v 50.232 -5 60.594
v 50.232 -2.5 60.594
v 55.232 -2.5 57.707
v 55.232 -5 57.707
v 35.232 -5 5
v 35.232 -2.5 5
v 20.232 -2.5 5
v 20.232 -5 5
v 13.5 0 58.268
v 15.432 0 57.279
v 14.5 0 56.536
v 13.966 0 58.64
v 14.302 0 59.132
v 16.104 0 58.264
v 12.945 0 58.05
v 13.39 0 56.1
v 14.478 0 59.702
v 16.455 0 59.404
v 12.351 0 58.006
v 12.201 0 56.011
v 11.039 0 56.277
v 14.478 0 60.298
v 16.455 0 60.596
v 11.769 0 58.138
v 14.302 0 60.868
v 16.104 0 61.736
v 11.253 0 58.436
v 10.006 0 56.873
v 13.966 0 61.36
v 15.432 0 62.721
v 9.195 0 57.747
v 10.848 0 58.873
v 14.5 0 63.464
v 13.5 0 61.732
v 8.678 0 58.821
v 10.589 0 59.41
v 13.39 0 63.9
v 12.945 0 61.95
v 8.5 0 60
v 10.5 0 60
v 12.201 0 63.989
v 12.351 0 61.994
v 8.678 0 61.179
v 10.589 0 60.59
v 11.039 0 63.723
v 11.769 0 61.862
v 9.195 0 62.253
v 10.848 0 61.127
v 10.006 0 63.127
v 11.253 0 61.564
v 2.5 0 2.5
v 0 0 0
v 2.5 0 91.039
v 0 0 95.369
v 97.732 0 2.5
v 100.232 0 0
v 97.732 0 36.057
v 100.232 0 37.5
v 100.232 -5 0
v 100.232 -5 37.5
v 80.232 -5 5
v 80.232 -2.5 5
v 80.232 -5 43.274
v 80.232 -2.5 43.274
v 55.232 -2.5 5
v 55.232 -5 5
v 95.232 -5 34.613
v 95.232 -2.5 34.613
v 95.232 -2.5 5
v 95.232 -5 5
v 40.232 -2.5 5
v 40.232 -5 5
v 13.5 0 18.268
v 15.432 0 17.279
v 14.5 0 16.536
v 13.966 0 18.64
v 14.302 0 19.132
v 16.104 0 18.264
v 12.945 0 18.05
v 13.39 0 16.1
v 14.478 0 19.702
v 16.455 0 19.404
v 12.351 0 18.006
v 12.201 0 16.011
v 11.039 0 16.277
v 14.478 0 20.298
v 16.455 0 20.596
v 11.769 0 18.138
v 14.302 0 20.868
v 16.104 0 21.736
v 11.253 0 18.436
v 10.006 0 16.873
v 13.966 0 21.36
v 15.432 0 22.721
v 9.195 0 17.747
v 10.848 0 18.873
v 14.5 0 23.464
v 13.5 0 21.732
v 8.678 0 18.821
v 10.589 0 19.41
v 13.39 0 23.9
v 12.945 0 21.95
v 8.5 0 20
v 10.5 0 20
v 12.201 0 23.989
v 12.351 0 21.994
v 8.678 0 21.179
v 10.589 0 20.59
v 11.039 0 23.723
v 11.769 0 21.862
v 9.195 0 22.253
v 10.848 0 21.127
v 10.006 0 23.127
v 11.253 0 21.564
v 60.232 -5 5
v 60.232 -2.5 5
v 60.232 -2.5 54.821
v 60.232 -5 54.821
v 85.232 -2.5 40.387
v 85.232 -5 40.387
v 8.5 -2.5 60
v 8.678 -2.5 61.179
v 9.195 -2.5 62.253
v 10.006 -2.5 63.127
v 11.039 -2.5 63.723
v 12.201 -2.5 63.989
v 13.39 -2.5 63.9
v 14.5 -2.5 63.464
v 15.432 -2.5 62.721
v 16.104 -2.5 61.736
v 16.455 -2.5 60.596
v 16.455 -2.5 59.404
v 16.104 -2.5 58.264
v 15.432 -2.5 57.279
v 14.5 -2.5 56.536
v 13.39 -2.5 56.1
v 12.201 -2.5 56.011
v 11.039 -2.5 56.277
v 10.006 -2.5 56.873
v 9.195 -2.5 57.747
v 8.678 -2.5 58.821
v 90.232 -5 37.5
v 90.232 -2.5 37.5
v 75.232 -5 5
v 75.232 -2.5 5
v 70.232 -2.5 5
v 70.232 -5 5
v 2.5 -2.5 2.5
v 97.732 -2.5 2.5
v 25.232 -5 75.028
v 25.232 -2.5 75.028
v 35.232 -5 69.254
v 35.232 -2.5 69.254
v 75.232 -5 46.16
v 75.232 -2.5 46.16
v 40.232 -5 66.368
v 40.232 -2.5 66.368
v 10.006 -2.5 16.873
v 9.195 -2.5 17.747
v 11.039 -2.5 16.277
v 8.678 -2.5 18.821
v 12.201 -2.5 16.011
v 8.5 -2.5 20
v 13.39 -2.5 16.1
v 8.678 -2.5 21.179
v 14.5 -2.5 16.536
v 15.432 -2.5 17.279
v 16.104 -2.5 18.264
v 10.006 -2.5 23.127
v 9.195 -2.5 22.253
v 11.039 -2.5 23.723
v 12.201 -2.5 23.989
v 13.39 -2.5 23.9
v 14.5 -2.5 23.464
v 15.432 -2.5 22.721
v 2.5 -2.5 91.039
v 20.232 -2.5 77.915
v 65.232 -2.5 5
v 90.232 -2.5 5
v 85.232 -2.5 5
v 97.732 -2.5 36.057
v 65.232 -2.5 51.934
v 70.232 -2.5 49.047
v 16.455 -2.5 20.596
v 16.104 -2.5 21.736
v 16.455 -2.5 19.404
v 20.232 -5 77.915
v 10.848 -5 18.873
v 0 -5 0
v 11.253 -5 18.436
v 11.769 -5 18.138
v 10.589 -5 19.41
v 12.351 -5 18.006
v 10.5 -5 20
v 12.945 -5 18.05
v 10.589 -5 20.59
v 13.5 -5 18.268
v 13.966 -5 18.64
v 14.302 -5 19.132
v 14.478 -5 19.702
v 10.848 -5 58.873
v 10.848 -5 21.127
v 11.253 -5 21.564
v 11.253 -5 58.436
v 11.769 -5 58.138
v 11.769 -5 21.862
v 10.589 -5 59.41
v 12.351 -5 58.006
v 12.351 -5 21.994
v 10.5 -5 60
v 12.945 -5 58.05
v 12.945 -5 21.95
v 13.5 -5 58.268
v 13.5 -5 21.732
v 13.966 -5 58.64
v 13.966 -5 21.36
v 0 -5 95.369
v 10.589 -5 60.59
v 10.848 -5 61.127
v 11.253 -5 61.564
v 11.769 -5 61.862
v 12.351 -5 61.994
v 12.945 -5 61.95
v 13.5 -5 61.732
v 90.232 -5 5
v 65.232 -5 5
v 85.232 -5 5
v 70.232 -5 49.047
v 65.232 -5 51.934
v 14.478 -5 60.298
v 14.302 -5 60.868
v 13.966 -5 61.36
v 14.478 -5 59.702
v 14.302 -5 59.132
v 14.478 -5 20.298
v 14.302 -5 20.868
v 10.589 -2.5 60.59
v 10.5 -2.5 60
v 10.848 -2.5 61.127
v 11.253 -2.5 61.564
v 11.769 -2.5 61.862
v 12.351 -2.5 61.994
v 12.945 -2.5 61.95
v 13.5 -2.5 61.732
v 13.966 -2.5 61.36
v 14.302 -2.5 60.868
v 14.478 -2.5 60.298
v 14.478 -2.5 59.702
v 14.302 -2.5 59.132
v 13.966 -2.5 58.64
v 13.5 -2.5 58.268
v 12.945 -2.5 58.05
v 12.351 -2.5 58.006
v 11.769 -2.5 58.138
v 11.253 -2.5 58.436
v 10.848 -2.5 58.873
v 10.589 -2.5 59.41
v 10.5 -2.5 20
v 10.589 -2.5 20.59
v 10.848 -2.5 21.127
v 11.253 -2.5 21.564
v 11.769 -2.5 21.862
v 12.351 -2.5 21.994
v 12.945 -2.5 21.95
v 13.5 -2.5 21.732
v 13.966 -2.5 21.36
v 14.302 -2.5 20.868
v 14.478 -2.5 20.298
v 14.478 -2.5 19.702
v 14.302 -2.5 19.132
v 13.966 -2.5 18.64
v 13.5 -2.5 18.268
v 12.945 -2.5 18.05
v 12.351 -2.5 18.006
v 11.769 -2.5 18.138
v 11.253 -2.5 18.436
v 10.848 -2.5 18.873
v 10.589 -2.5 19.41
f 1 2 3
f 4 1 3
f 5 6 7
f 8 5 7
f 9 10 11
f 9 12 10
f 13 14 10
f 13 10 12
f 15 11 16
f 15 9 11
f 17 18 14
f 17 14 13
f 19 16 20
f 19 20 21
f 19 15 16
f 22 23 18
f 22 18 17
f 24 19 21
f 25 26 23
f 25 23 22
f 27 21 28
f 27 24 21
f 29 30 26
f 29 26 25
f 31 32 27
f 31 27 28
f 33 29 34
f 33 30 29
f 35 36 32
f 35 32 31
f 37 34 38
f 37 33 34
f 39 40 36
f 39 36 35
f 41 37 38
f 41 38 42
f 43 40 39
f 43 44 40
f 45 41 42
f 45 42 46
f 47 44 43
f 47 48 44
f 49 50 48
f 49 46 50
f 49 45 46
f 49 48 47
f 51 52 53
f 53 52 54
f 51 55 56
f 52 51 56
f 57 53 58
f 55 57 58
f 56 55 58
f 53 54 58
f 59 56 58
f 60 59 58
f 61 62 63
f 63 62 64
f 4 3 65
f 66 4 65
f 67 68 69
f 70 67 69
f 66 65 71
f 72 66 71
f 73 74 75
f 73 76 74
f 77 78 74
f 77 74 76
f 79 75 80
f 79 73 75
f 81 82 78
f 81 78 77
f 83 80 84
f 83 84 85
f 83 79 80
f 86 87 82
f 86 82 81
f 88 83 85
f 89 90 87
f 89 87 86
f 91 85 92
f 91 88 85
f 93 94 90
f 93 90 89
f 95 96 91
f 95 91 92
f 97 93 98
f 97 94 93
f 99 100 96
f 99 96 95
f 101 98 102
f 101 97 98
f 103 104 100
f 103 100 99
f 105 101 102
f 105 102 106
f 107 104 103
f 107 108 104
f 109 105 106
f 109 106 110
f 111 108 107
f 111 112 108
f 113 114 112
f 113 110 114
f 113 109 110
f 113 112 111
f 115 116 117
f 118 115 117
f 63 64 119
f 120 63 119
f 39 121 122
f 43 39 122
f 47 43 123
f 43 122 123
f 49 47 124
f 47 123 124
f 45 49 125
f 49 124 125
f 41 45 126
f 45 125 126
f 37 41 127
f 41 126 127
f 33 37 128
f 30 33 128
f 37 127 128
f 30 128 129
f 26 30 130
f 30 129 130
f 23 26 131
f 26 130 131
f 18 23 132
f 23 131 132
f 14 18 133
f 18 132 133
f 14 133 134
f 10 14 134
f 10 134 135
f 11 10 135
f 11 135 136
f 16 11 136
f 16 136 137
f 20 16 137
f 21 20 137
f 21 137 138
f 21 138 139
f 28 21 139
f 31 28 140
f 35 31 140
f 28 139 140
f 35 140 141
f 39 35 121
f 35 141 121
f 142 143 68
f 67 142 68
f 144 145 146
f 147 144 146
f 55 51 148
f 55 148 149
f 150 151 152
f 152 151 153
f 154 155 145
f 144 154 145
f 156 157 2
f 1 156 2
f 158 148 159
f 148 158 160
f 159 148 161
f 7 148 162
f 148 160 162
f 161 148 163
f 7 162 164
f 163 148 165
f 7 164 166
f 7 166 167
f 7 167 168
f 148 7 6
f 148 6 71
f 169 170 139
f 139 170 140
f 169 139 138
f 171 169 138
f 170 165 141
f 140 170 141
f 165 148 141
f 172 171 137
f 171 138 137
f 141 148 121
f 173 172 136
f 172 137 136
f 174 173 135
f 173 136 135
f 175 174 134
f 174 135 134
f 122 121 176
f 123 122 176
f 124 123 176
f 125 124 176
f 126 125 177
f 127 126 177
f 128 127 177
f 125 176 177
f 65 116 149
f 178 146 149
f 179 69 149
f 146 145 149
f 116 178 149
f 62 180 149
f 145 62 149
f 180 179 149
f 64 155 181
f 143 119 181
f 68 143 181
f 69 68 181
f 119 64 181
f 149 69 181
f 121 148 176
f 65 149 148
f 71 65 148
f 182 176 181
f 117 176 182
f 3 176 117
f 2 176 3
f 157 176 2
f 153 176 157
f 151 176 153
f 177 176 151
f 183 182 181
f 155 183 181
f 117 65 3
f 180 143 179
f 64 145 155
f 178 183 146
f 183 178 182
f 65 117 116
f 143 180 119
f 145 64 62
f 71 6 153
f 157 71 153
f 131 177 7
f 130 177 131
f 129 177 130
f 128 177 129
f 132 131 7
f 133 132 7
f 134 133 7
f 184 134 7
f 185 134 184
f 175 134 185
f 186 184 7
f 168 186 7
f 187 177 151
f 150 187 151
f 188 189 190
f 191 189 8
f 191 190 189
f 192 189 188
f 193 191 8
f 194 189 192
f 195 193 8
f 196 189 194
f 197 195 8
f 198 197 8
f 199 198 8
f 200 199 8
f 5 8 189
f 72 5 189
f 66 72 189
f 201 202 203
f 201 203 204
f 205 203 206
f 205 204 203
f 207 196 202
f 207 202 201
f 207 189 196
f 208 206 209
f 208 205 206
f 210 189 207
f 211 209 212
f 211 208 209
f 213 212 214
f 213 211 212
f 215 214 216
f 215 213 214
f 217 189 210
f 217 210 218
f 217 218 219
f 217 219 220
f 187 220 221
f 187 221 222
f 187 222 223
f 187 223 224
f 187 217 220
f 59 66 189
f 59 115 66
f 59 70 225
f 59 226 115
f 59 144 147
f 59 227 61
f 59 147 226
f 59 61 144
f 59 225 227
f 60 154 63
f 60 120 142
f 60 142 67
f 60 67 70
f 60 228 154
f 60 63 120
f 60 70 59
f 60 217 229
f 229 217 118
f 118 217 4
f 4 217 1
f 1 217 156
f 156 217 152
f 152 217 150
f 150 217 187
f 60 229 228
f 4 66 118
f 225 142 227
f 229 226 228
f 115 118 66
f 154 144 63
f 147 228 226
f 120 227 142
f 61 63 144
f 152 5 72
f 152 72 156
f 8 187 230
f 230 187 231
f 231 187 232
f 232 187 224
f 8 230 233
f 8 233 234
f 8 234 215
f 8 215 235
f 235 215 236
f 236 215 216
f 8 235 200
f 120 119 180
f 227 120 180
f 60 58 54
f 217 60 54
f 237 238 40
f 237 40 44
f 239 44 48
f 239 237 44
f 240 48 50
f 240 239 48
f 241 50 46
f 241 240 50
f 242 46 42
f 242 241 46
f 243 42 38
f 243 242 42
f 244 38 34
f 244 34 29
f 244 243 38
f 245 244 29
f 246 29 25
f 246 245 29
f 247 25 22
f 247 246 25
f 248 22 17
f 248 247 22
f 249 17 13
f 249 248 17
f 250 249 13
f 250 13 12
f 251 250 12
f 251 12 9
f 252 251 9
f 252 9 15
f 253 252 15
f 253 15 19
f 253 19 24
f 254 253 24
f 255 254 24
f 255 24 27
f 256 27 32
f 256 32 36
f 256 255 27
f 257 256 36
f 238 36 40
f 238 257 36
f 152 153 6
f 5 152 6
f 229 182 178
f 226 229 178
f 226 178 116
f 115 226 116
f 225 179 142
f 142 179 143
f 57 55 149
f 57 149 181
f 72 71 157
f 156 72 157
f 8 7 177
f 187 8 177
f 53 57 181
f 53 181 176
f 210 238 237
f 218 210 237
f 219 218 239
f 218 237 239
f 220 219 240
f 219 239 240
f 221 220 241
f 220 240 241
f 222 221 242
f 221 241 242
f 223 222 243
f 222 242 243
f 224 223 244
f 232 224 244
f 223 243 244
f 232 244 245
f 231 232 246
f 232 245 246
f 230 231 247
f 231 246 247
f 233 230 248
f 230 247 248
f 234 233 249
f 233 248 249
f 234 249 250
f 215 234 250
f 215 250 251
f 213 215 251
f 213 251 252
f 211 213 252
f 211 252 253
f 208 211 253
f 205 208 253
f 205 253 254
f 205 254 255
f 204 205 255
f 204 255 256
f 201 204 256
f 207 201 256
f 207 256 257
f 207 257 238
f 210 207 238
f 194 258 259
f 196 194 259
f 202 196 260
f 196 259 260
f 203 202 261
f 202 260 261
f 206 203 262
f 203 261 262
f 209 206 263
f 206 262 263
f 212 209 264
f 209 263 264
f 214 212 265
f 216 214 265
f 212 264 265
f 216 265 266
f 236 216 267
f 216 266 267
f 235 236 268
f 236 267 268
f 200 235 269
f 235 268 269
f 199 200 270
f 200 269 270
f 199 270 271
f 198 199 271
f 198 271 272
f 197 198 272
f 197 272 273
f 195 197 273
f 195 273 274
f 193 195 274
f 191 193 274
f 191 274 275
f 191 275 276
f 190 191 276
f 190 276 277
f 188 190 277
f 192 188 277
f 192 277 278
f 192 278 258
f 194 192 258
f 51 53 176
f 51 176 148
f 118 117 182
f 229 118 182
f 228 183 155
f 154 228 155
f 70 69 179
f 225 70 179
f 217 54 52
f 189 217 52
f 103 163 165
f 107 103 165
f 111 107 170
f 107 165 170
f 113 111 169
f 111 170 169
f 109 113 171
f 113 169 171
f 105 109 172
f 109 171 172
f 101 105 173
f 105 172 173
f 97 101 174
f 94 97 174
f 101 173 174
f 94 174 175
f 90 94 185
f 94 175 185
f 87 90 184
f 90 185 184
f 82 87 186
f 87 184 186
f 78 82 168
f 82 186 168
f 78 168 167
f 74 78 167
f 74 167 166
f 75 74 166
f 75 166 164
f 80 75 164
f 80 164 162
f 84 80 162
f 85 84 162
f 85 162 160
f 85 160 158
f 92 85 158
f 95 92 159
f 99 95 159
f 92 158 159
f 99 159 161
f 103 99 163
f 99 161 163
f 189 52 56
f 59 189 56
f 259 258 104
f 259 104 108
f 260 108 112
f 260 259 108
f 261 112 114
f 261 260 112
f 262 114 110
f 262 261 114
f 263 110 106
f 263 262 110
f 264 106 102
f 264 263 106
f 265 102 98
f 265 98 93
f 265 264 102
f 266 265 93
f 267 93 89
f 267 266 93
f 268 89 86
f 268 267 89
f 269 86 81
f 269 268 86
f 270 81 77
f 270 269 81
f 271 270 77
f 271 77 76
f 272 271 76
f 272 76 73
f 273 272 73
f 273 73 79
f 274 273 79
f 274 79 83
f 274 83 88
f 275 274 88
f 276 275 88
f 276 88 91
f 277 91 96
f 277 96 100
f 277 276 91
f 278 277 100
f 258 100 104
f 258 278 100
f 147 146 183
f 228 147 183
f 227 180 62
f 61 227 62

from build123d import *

# Parameters (mm, degrees)
F1_DEPTH = 5
F2_T     = -2.5
F4_DEPTH = 5.001
F5_R     = 2
F6_DEPTH = 5.001
F7_R     = 4
F7_R_2   = 2
F8_DEPTH = 2.5


with BuildPart() as f1:
    # F0 (on Front) → F1 (new body)
    with BuildSketch(Plane.XZ):
        Polygon((0, 95.369), (0, 0), (100.232048, 0), (100.232048, 37.5), align=None)
    extrude(amount=F1_DEPTH)

    # F2
    f2_openings = [f1.faces().sort_by_distance(p)[0] for p in [
        (42.840276, 0, 35.317578),
    ]]
    offset(amount=F2_T, openings=f2_openings)

    # F3 (on face) → F4 (cut, through all)
    with BuildSketch(Plane(origin=(0, 0, 0), x_dir=(-1, 0, 0), z_dir=(0, 1, 0))):
        Polygon((-90.232048, 37.5), (-95.232048, 34.613249), (-95.232048, 5), (-90.232048, 5), align=None)
        Polygon((-85.232048, 40.386751), (-85.232048, 5), (-80.232048, 5), (-80.232048, 43.273503), align=None)
        Polygon((-75.232048, 46.160254), (-75.232048, 5), (-70.232048, 5), (-70.232048, 49.047005), align=None)
        Polygon((-65.232048, 51.933757), (-65.232048, 5), (-60.232048, 5), (-60.232048, 54.820508), align=None)
        Polygon((-55.232048, 57.707259), (-55.232048, 5), (-50.232048, 5), (-50.232048, 60.594011), align=None)
        Polygon((-50.232048, 60.594011), (-50.232048, 5), (-45.232048, 5), (-45.232048, 63.480762), align=None)
        Polygon((-45.232048, 63.480762), (-45.232048, 5), (-40.232048, 5), (-40.232048, 66.367513), align=None)
        Polygon((-30.232048, 72.141016), (-35.232048, 69.254265), (-35.232048, 5), (-30.232048, 5), align=None)
        Polygon((-25.232048, 75.027767), (-30.232048, 72.141016), (-30.232048, 5), (-25.232048, 5), align=None)
        Polygon((-20.232048, 77.914519), (-25.232048, 75.027767), (-25.232048, 5), (-20.232048, 5), align=None)
    extrude(amount=-F4_DEPTH, mode=Mode.SUBTRACT)

    # F5 (on face) → F6 (cut, through all)
    with BuildSketch(Plane(origin=(0, 0, 0), x_dir=(-1, 0, 0), z_dir=(0, 1, 0))):
        with Locations((-12.5, 60)):
            Circle(F5_R)
        with Locations((-12.5, 20)):
            Circle(F5_R)
    extrude(amount=-F6_DEPTH, mode=Mode.SUBTRACT)

    # F7 (on face) → F8 (join, through all)
    with BuildSketch(Plane(origin=(0, -2.5, 0), x_dir=(-1, 0, 0), z_dir=(0, 1, 0))):
        with Locations((-12.5, 60)):
            Circle(F7_R)
        with Locations((-12.5, 60)):
            Circle(F7_R_2, mode=Mode.SUBTRACT)
        with Locations((-12.5, 20)):
            Circle(F7_R)
        with Locations((-12.5, 20)):
            Circle(F7_R_2, mode=Mode.SUBTRACT)
    extrude(amount=F8_DEPTH)


solid = f1.part
